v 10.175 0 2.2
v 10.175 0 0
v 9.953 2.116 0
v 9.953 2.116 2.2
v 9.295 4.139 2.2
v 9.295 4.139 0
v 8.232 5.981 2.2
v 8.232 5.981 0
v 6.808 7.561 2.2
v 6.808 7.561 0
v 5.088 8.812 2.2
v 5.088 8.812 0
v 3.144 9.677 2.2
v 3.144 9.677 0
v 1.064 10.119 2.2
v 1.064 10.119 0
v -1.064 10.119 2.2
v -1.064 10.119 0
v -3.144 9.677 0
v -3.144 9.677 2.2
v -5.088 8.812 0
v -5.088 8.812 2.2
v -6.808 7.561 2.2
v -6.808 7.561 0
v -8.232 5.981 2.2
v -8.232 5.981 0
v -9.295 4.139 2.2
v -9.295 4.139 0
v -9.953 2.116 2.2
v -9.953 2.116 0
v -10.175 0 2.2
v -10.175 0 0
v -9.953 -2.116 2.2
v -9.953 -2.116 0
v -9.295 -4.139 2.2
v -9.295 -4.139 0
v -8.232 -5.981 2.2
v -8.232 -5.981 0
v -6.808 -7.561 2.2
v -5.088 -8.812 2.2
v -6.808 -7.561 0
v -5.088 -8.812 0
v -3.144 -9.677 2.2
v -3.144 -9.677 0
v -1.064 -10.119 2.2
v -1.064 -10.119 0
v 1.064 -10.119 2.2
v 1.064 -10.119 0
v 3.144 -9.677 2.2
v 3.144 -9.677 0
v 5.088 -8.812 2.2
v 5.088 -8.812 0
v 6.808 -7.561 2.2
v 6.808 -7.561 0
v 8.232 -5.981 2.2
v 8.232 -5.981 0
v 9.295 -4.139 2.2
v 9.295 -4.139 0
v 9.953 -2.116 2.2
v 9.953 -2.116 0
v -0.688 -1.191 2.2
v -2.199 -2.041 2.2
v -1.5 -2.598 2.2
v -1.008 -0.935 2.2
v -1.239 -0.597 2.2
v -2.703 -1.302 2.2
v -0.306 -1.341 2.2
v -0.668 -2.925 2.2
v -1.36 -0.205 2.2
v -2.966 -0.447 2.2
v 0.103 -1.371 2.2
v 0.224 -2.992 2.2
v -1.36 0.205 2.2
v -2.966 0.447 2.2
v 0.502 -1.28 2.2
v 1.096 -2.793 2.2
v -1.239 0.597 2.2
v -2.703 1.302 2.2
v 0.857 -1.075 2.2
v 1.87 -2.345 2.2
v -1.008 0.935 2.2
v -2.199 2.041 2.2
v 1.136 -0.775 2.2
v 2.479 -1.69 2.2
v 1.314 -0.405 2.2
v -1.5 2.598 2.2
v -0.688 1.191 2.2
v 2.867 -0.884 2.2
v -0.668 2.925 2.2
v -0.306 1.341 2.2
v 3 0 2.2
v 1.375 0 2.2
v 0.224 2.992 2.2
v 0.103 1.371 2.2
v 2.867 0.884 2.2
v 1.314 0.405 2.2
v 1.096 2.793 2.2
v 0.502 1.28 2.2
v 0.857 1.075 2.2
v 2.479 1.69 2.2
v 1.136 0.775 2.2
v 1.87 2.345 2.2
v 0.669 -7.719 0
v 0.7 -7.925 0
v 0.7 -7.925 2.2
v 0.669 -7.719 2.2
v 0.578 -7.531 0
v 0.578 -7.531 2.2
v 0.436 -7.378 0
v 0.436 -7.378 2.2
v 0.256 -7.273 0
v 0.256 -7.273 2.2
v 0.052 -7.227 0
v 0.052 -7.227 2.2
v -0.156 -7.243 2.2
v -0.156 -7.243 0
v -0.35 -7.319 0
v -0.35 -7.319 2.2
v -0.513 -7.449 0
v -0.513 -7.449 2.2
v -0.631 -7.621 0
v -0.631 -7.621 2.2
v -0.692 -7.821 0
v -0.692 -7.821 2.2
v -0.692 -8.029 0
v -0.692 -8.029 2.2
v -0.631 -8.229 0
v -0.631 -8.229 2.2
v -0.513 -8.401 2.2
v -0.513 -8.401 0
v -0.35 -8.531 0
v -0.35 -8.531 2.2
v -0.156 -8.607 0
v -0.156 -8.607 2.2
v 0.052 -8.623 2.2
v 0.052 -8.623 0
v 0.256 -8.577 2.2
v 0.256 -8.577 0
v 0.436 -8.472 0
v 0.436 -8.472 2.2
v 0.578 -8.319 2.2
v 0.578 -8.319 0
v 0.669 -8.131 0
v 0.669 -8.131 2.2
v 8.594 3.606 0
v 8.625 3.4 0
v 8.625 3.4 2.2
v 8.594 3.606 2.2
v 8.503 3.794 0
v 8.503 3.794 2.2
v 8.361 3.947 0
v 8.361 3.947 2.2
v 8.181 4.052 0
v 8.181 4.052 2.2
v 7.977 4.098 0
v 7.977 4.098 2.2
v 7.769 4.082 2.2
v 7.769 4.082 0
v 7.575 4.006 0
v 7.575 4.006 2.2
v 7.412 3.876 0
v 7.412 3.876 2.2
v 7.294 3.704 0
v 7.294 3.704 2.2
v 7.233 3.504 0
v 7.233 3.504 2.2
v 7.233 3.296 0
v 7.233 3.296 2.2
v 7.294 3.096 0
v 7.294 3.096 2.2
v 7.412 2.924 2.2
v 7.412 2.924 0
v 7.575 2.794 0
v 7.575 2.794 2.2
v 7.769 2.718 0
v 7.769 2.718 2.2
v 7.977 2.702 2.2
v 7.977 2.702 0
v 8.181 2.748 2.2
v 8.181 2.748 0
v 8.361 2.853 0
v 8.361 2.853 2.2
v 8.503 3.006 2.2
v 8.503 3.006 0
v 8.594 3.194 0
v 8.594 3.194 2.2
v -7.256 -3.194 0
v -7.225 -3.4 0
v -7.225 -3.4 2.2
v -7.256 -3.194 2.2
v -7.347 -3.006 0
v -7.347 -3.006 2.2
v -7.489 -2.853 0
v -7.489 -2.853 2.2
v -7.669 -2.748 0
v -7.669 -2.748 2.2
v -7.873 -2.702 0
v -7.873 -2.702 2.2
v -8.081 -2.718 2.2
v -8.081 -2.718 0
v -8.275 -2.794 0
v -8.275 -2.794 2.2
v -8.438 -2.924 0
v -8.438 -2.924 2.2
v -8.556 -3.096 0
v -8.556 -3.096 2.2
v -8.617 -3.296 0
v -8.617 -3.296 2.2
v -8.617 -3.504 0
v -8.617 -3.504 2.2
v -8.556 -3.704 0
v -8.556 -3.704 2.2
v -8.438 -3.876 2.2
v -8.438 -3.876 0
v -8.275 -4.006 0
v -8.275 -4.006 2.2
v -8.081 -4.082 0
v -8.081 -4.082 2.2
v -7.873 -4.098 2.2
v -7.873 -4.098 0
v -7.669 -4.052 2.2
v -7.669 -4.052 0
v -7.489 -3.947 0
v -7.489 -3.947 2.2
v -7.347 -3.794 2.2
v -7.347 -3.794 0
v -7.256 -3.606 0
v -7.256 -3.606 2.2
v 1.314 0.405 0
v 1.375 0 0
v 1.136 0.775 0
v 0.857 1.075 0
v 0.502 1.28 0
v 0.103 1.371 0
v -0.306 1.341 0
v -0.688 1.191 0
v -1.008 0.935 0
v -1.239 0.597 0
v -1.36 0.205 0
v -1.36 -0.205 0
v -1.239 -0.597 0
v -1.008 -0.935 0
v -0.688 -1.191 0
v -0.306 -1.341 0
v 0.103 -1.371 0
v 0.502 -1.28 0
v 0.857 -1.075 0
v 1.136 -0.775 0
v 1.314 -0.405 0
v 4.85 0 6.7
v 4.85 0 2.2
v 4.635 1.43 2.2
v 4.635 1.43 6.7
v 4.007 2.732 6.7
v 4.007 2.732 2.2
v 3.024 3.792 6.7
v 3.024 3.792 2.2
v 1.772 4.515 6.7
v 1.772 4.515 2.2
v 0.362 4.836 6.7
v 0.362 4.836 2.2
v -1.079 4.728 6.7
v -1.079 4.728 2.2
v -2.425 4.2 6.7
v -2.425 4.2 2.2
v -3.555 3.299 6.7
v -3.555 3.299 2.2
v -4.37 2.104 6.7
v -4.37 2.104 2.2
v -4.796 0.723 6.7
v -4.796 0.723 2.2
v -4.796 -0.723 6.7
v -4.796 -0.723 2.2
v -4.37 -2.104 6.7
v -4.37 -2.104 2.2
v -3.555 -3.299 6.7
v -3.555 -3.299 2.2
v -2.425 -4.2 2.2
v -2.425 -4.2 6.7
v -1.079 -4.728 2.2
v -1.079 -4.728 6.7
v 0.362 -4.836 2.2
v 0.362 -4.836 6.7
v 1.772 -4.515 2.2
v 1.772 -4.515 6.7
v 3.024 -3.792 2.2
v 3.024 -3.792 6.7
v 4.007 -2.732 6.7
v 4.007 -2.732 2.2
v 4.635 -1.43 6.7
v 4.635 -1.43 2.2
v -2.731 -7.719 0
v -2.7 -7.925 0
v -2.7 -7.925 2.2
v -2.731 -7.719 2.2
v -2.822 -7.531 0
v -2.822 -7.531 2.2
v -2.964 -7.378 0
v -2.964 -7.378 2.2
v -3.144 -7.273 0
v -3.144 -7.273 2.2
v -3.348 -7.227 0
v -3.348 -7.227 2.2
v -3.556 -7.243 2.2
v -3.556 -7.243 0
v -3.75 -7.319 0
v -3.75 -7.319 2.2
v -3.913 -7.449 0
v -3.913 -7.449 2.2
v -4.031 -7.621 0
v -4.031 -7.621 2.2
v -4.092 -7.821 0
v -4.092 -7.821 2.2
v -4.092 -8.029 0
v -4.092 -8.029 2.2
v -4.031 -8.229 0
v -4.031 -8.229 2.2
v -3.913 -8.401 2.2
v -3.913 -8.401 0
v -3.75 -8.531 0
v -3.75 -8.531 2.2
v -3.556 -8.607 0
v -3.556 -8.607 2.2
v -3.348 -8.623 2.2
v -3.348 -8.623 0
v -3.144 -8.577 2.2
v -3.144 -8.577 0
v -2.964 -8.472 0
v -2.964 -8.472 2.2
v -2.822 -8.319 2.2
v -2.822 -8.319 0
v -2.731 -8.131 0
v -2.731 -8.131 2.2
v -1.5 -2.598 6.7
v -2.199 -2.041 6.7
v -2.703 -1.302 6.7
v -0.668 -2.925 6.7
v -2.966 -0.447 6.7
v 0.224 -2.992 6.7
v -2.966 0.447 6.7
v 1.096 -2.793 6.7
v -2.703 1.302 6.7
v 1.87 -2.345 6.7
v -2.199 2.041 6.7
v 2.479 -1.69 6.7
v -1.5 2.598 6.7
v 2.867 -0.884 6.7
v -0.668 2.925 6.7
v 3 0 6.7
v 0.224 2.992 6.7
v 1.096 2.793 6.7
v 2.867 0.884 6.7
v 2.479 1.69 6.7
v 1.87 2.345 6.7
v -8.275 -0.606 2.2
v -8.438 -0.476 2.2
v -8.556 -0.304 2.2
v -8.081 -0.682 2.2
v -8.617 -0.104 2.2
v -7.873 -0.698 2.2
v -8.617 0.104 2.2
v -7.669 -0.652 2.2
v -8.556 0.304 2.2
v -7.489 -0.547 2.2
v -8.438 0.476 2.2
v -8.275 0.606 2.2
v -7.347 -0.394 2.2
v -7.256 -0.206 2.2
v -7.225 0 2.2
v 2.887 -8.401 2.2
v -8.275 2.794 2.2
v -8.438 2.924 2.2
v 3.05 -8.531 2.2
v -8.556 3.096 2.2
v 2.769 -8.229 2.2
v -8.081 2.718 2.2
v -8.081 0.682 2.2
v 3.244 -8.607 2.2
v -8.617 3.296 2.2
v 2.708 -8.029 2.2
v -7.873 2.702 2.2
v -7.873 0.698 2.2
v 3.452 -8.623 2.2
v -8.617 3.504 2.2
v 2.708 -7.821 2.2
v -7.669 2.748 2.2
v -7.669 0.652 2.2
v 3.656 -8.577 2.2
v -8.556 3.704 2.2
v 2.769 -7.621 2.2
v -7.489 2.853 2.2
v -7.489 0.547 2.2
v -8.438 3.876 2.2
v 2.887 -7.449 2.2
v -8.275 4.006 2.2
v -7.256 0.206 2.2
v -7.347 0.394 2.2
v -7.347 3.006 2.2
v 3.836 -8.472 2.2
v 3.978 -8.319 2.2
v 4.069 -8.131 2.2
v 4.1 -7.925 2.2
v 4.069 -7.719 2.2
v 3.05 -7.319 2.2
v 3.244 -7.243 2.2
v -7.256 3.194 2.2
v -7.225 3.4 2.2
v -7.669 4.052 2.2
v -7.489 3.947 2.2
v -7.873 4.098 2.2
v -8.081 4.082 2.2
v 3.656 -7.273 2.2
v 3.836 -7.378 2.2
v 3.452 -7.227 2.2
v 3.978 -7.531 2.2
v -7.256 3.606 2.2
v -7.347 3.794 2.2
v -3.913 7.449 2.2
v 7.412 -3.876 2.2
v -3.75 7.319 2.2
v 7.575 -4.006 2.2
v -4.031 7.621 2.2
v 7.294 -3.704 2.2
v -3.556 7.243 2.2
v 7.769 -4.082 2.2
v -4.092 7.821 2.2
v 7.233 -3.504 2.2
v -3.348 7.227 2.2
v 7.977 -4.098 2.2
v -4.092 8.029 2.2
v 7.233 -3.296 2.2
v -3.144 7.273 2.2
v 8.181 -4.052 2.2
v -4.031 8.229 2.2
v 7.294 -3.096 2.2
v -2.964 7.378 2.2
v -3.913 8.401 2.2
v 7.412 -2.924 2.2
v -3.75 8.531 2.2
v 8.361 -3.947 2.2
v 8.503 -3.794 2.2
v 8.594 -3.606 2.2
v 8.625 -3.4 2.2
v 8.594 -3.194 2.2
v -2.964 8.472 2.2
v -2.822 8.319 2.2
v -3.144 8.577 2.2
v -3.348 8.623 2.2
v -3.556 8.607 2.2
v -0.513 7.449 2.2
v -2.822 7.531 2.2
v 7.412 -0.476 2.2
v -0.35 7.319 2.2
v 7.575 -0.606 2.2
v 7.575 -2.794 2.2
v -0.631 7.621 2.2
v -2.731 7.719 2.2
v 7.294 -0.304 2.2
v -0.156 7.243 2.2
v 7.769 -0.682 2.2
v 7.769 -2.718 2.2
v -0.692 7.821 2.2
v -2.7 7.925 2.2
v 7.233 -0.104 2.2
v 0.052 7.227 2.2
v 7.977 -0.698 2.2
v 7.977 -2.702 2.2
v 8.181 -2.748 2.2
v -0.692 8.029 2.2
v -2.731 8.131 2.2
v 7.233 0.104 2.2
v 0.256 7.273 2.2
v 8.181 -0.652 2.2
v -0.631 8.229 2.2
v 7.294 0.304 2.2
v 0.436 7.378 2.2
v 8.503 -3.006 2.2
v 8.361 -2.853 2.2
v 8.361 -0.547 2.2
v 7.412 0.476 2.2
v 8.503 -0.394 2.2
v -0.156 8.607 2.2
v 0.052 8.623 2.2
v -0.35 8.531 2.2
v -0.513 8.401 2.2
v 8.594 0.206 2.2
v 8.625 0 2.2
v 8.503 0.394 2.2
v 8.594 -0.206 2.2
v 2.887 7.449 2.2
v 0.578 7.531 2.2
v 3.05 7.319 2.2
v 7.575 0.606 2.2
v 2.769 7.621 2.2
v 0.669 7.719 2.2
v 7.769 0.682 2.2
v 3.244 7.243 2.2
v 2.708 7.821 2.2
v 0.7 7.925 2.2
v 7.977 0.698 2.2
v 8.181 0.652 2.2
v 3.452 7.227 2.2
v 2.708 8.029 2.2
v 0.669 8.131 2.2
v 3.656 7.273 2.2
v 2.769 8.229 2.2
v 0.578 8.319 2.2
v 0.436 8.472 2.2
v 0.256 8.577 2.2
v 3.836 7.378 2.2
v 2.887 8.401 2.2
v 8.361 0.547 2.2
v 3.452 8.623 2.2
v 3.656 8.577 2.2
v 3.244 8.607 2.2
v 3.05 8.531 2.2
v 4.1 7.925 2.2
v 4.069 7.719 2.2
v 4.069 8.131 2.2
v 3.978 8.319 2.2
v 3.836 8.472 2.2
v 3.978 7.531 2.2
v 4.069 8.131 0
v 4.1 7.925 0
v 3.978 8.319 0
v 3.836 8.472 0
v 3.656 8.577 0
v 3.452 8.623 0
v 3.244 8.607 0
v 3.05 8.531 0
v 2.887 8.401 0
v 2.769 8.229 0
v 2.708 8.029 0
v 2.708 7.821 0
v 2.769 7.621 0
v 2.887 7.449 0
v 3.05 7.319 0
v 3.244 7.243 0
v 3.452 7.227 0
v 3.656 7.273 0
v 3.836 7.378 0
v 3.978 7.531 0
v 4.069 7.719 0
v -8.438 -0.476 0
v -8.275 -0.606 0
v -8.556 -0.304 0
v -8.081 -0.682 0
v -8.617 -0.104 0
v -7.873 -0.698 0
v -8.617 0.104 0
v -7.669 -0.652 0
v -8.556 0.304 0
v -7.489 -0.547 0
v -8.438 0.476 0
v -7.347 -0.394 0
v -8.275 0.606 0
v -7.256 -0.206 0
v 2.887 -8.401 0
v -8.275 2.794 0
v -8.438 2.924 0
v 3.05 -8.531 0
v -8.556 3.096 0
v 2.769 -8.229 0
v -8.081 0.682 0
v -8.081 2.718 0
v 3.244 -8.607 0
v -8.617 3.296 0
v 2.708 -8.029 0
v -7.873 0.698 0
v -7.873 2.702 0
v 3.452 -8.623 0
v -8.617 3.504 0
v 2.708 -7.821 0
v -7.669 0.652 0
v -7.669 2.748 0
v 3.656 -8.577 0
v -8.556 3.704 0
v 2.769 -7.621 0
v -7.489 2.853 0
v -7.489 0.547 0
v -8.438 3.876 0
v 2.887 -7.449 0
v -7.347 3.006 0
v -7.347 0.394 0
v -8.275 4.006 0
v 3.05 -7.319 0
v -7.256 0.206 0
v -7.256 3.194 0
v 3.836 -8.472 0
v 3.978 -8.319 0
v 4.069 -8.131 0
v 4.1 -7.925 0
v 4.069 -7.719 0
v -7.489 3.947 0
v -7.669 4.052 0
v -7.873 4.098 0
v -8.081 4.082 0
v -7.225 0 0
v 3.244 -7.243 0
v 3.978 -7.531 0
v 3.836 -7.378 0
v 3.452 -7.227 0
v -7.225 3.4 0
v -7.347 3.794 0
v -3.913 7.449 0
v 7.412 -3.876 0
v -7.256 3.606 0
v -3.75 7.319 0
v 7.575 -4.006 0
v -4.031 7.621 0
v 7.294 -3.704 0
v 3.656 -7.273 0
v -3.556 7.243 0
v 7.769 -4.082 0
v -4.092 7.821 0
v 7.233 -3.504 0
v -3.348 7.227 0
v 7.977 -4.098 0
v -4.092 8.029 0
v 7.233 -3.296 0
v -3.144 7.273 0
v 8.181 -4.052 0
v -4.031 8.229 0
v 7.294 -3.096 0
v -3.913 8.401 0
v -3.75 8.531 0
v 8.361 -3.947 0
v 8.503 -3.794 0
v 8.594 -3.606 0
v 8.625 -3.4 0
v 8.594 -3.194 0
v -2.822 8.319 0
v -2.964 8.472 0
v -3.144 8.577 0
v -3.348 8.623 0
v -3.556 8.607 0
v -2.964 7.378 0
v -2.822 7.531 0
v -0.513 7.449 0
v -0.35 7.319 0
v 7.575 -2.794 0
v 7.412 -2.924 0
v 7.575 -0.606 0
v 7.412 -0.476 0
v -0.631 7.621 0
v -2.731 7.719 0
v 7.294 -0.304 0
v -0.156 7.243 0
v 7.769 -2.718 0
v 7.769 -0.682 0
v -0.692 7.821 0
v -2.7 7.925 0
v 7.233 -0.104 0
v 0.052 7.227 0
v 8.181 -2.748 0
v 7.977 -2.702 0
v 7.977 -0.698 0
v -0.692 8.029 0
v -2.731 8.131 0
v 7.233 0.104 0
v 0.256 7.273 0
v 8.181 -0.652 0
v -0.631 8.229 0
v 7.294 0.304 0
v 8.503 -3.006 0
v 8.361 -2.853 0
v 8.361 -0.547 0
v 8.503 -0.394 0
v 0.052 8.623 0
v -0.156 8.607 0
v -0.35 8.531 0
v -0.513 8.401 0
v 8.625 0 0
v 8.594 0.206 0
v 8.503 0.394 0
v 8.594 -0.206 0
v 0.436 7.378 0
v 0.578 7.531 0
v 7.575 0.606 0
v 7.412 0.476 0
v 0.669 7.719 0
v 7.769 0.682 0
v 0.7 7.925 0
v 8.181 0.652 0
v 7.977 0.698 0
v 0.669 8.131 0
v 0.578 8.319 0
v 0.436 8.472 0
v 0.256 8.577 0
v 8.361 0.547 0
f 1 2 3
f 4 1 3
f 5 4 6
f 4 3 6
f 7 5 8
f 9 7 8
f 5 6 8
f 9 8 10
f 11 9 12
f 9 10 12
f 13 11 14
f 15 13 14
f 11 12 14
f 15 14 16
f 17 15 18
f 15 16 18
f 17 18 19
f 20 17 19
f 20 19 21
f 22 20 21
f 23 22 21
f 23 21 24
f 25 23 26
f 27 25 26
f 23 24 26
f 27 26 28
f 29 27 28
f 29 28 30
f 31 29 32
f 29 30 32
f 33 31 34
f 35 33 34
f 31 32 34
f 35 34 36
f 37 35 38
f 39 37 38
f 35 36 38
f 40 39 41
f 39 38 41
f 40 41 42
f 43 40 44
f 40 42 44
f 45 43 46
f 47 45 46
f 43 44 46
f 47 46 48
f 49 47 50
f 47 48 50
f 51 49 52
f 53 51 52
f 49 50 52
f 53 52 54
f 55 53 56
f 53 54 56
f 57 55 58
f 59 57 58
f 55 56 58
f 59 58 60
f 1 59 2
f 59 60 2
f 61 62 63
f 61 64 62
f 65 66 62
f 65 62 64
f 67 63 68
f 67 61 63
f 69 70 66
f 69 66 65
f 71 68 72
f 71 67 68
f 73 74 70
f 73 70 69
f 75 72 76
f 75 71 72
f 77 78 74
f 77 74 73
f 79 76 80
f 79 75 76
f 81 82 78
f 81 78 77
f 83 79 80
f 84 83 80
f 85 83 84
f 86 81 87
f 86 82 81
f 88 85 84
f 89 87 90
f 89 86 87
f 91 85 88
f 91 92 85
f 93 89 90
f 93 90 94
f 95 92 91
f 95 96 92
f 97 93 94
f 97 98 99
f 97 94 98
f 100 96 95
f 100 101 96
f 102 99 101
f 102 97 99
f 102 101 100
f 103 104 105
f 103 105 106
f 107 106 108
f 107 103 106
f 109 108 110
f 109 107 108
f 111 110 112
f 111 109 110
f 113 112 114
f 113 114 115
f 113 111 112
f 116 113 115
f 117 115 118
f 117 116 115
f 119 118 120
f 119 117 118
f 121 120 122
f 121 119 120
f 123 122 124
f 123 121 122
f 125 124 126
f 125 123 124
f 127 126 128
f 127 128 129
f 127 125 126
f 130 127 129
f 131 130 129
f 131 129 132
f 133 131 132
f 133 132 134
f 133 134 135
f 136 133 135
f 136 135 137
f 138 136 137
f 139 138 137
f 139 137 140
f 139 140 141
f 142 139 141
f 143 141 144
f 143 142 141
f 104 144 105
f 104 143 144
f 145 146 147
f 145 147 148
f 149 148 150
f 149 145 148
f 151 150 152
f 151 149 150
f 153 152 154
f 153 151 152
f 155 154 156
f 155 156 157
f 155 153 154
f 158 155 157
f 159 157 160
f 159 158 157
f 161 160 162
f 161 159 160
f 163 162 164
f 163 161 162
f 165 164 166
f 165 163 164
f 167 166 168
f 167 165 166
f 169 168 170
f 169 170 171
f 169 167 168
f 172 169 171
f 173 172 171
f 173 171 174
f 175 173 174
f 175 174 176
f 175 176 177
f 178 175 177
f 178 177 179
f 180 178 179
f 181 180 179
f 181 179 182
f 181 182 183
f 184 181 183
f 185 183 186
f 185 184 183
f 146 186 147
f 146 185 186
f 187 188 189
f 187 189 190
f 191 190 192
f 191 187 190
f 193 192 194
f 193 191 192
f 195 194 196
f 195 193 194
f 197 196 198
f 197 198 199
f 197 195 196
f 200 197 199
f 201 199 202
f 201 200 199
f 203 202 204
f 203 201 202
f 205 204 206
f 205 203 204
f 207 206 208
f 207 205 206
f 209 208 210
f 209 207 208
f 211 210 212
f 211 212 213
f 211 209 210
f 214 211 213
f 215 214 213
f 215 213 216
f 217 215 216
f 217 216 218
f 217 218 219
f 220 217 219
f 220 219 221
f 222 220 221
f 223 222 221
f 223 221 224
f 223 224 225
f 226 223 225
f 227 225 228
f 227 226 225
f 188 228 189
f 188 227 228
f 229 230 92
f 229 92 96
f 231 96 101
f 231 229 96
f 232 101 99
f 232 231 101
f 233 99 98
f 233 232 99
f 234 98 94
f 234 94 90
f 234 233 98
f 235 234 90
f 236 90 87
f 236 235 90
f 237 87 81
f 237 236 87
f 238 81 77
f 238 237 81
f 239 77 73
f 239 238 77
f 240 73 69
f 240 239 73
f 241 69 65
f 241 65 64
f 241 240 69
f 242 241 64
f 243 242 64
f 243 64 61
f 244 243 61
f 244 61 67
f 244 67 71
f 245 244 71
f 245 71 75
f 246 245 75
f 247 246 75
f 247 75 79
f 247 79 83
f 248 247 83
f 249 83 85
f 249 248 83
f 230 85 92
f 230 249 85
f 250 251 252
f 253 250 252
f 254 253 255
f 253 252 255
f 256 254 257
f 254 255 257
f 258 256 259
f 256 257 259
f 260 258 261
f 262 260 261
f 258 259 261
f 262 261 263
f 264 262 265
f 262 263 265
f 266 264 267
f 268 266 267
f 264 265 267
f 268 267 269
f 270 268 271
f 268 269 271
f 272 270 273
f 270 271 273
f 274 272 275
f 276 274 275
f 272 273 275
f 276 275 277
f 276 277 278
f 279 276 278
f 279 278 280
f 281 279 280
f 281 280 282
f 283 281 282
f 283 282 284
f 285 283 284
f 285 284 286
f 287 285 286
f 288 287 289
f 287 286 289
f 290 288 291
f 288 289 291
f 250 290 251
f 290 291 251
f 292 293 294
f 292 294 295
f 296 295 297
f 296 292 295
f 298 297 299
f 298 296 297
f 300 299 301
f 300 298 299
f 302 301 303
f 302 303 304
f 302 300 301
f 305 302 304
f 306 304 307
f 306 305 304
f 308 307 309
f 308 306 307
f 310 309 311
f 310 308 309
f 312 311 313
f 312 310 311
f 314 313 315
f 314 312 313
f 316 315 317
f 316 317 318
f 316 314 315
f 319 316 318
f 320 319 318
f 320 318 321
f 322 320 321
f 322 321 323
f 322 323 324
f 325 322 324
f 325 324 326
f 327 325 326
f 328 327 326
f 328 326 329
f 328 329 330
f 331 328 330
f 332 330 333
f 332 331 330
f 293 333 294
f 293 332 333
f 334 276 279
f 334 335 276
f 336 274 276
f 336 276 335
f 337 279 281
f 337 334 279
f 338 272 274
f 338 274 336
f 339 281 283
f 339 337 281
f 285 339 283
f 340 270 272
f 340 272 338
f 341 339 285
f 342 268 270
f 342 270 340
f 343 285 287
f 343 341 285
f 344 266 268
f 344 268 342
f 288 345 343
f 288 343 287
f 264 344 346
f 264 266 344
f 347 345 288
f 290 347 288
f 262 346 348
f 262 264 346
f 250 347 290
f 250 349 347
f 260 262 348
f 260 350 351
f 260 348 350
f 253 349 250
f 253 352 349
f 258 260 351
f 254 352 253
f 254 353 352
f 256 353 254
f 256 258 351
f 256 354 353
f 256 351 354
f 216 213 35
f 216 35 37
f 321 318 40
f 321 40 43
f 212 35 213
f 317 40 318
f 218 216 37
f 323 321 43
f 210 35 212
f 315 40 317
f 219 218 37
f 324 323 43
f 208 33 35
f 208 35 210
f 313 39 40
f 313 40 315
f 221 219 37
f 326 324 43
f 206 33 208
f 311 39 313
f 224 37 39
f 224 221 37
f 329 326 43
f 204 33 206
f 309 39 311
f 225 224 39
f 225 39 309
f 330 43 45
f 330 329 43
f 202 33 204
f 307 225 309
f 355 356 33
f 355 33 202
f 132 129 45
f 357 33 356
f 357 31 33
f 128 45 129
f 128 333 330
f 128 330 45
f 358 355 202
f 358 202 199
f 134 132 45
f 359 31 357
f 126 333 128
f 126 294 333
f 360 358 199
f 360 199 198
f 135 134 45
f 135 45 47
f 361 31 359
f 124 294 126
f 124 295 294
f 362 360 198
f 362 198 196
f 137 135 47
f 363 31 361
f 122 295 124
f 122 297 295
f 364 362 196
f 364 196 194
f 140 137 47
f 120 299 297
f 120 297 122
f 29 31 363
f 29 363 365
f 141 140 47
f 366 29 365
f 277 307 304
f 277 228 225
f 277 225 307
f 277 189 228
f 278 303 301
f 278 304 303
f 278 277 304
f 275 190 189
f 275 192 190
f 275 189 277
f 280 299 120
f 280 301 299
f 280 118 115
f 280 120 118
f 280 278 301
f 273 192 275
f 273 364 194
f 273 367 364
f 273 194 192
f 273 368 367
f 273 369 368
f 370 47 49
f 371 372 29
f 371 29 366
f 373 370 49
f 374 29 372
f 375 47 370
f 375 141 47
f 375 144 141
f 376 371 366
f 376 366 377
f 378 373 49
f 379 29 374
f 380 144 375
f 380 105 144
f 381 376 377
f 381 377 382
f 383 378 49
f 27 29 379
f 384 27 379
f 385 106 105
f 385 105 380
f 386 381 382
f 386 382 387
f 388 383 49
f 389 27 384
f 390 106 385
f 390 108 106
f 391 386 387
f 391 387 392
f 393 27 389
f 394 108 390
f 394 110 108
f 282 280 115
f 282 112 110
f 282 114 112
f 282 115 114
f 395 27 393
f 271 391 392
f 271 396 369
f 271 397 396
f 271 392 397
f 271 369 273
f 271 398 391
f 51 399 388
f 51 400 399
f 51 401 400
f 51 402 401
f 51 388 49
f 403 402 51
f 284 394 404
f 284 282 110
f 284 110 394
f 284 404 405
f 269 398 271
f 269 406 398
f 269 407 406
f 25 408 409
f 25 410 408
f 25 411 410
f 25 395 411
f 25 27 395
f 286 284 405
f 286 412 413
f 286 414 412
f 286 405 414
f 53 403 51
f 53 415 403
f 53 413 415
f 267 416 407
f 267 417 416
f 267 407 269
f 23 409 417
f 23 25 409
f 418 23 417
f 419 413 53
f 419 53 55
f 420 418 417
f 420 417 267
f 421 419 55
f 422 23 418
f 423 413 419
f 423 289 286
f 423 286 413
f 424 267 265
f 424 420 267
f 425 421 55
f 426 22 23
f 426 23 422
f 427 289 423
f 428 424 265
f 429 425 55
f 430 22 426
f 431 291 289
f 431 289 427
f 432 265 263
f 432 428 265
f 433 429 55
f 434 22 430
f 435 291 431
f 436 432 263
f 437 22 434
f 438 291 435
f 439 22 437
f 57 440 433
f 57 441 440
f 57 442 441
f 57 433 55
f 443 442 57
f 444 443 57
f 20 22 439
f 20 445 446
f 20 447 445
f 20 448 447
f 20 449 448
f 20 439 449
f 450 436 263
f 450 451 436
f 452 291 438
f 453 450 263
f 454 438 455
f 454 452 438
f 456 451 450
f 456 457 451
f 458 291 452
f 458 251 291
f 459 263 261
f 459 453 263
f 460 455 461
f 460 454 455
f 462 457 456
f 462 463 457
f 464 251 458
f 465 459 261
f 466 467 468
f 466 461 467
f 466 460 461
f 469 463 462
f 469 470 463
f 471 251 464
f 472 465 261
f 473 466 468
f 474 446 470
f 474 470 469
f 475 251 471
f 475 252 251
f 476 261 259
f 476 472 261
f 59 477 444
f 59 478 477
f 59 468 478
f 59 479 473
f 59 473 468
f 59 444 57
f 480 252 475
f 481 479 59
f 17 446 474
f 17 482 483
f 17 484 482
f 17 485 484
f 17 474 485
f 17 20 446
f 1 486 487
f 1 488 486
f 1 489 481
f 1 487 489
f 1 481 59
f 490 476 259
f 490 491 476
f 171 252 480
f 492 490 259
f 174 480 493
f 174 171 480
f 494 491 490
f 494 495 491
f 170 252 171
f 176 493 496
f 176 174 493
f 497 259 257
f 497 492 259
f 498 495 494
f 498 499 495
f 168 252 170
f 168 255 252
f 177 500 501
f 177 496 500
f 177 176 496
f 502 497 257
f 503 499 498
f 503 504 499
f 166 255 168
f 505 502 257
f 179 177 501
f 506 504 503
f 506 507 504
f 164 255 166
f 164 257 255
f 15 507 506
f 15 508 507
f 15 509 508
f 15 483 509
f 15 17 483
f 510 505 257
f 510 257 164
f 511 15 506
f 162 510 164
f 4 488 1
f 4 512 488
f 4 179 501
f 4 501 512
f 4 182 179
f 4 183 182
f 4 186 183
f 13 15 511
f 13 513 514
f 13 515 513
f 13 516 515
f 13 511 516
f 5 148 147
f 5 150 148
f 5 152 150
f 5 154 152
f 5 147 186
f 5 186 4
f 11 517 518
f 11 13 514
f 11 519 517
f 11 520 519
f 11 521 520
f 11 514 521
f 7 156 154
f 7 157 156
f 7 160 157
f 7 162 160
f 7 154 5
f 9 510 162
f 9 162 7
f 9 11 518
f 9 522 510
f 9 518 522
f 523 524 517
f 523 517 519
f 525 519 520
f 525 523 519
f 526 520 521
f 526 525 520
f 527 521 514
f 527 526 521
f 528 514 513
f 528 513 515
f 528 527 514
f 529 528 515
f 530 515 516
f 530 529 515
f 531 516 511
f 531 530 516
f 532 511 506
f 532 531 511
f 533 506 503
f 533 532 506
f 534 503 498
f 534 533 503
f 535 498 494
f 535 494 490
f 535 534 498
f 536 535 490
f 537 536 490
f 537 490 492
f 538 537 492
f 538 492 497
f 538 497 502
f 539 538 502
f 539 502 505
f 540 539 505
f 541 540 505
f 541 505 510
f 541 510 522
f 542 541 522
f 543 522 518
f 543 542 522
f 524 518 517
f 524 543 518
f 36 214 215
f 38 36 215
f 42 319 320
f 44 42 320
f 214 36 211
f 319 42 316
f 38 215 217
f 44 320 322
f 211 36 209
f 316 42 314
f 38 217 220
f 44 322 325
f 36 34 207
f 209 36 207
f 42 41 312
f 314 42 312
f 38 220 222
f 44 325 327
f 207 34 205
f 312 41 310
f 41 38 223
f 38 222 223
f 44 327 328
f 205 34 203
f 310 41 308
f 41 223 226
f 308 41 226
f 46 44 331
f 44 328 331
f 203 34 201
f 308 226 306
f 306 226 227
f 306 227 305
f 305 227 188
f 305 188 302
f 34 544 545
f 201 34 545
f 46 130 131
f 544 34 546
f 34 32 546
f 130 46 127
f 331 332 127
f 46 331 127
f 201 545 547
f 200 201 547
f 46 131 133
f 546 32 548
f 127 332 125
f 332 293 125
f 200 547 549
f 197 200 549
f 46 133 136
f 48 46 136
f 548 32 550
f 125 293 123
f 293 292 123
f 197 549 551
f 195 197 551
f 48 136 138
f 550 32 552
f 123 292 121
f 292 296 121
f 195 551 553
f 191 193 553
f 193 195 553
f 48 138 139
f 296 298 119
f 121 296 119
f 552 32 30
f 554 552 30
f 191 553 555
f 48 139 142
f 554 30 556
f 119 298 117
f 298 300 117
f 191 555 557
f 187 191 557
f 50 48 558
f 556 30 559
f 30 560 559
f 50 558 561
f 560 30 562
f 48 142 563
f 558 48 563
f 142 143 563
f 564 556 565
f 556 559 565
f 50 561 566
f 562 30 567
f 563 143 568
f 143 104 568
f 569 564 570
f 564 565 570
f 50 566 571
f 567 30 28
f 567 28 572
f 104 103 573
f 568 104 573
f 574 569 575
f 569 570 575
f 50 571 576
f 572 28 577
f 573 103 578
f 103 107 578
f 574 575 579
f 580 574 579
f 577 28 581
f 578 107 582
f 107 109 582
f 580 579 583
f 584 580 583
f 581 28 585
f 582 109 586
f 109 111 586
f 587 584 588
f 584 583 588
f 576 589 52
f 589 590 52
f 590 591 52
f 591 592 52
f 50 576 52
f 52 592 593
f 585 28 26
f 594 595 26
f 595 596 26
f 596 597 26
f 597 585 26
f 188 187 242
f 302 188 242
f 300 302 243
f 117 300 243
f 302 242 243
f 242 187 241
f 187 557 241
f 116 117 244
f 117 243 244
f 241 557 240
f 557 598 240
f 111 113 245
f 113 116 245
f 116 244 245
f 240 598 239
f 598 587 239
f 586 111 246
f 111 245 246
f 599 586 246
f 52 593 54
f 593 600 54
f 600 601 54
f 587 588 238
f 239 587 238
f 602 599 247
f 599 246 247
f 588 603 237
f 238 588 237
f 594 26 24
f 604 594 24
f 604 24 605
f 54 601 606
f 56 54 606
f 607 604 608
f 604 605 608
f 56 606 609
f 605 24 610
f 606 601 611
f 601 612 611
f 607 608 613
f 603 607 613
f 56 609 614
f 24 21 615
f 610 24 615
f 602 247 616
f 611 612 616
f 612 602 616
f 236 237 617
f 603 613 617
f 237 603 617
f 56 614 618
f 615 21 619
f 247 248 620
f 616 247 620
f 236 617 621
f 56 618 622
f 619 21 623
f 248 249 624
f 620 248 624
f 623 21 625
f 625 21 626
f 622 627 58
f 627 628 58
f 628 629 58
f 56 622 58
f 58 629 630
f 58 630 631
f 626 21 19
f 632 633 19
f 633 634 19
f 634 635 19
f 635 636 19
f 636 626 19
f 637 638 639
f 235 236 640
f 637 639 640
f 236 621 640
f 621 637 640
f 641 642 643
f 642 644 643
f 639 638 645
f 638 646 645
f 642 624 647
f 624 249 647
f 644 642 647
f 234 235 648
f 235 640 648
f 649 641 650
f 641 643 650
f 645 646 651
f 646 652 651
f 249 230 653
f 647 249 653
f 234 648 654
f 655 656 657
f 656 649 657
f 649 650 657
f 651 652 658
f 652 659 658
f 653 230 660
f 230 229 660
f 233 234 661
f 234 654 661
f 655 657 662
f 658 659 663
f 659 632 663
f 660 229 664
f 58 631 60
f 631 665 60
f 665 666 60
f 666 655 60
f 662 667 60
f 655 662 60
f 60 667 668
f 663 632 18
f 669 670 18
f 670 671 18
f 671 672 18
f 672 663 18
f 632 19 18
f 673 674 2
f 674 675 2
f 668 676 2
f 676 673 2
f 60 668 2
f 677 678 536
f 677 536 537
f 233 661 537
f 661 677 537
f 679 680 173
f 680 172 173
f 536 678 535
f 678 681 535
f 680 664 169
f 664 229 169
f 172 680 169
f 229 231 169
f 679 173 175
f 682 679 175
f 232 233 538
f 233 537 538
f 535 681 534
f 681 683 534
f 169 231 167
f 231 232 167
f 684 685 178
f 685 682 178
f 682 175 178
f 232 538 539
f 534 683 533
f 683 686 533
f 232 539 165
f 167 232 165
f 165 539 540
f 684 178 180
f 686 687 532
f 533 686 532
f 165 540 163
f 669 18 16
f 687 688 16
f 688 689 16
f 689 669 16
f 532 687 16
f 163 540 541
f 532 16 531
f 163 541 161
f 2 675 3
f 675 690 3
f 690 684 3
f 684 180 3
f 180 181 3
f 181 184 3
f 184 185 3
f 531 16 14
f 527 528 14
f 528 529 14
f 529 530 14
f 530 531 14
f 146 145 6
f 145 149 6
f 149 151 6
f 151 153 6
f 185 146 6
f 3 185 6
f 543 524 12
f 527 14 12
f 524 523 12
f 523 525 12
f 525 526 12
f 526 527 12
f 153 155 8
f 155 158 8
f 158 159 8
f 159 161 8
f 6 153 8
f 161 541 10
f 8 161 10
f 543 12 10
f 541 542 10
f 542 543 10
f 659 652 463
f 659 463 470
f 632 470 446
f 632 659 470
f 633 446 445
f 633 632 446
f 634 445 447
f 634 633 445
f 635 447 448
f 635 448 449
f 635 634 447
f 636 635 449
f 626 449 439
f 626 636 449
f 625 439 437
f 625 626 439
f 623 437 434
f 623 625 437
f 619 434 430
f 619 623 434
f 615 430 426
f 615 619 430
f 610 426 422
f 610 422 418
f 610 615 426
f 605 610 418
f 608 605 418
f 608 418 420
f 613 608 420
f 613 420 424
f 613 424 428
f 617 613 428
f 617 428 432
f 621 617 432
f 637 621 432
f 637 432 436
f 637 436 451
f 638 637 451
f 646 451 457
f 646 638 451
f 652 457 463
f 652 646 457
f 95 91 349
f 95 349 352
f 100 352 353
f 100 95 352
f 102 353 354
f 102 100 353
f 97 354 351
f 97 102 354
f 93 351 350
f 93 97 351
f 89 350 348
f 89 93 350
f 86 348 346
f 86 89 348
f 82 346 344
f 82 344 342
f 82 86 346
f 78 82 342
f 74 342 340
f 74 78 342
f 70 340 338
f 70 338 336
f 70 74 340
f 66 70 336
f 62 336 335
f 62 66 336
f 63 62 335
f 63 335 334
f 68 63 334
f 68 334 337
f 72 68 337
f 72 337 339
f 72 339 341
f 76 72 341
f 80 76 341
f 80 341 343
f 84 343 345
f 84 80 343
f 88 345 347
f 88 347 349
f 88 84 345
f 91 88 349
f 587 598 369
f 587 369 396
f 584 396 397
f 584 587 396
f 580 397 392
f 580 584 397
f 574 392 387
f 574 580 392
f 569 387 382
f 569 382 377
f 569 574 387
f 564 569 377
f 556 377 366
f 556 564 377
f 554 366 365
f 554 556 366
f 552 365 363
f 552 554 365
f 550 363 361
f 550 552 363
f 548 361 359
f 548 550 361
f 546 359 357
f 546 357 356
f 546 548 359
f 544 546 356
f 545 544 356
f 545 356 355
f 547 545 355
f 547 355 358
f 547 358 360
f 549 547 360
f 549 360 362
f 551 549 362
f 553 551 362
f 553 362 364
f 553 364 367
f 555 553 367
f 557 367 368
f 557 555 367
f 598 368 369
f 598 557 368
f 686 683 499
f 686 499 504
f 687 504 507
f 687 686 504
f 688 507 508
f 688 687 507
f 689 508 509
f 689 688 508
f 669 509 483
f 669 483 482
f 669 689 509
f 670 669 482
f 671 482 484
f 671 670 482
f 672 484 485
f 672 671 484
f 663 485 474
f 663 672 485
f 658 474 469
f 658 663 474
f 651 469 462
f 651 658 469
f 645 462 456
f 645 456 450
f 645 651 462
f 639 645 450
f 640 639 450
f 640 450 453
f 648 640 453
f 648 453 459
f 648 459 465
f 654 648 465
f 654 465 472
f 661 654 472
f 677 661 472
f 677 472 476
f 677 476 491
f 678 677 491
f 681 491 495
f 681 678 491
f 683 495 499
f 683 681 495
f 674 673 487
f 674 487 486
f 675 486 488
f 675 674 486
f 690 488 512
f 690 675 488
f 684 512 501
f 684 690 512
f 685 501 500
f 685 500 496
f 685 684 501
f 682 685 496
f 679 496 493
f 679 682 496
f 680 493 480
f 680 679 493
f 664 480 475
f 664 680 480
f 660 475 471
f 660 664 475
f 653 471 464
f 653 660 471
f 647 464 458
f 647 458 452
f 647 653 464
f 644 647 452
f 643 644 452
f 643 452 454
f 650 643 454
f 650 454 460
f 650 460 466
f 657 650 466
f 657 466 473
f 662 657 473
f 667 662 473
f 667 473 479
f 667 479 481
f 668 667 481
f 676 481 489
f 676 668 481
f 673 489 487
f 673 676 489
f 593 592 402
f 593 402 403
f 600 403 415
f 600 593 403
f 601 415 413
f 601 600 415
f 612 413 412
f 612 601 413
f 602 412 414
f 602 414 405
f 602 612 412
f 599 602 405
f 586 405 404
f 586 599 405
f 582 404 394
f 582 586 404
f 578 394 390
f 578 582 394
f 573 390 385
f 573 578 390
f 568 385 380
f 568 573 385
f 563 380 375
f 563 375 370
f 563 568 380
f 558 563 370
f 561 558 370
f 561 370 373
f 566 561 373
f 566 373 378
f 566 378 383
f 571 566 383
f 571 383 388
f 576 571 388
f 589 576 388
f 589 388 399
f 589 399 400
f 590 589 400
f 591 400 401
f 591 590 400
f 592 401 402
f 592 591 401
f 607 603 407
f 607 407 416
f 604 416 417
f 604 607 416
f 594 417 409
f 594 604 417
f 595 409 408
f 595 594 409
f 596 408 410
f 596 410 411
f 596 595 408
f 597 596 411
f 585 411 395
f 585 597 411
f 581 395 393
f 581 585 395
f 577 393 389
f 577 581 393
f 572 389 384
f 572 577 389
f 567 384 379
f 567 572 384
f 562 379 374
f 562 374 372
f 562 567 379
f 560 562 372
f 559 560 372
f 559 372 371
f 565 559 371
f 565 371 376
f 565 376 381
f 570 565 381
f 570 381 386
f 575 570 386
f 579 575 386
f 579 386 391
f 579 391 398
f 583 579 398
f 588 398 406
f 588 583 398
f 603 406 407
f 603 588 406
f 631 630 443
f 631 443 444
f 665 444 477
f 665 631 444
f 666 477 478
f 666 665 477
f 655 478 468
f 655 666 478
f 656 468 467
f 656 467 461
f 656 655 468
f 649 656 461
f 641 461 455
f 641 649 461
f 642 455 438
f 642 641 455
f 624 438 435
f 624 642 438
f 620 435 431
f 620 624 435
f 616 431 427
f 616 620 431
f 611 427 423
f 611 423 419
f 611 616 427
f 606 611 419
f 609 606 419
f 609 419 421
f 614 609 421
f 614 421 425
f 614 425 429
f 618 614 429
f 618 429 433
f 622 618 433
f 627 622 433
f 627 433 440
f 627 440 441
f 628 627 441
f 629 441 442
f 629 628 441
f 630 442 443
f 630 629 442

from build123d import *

# Parameters (mm, degrees)
SKETCH_1_R      = 10.175
SKETCH_1_R_2    = 1.375
SKETCH_1_R_3    = 0.7
EXTRUDE_1_DEPTH = 2.2
SKETCH_2_R      = 4.85
SKETCH_2_R_2    = 3
EXTRUDE_2_DEPTH = 4.5


with BuildPart() as part:
    # 草圖1 → 填料-伸長1 (new body)
    with BuildSketch(Plane.XY):
        Circle(SKETCH_1_R)
        Circle(SKETCH_1_R_2, mode=Mode.SUBTRACT)
        with Locations((7.925, 0)):
            Circle(SKETCH_1_R_3, mode=Mode.SUBTRACT)
        with Locations((7.925, 3.4)):
            Circle(SKETCH_1_R_3, mode=Mode.SUBTRACT)
        with Locations((7.925, -3.4)):
            Circle(SKETCH_1_R_3, mode=Mode.SUBTRACT)
        with Locations((-7.925, 0)):
            Circle(SKETCH_1_R_3, mode=Mode.SUBTRACT)
        with Locations((-7.925, 3.4)):
            Circle(SKETCH_1_R_3, mode=Mode.SUBTRACT)
        with Locations((-7.925, -3.4)):
            Circle(SKETCH_1_R_3, mode=Mode.SUBTRACT)
        with Locations((0, -7.925)):
            Circle(SKETCH_1_R_3, mode=Mode.SUBTRACT)
        with Locations((-3.4, -7.925)):
            Circle(SKETCH_1_R_3, mode=Mode.SUBTRACT)
        with Locations((3.4, -7.925)):
            Circle(SKETCH_1_R_3, mode=Mode.SUBTRACT)
        with Locations((0, 7.925)):
            Circle(SKETCH_1_R_3, mode=Mode.SUBTRACT)
        with Locations((3.4, 7.925)):
            Circle(SKETCH_1_R_3, mode=Mode.SUBTRACT)
        with Locations((-3.4, 7.925)):
            Circle(SKETCH_1_R_3, mode=Mode.SUBTRACT)
    extrude(amount=EXTRUDE_1_DEPTH)

    # 草圖2 → 填料-伸長2 (add)
    with BuildSketch(Plane.XY.offset(2.2)):
        Circle(SKETCH_2_R)
        Circle(SKETCH_2_R_2, mode=Mode.SUBTRACT)
    extrude(amount=EXTRUDE_2_DEPTH)


solid = part.part
